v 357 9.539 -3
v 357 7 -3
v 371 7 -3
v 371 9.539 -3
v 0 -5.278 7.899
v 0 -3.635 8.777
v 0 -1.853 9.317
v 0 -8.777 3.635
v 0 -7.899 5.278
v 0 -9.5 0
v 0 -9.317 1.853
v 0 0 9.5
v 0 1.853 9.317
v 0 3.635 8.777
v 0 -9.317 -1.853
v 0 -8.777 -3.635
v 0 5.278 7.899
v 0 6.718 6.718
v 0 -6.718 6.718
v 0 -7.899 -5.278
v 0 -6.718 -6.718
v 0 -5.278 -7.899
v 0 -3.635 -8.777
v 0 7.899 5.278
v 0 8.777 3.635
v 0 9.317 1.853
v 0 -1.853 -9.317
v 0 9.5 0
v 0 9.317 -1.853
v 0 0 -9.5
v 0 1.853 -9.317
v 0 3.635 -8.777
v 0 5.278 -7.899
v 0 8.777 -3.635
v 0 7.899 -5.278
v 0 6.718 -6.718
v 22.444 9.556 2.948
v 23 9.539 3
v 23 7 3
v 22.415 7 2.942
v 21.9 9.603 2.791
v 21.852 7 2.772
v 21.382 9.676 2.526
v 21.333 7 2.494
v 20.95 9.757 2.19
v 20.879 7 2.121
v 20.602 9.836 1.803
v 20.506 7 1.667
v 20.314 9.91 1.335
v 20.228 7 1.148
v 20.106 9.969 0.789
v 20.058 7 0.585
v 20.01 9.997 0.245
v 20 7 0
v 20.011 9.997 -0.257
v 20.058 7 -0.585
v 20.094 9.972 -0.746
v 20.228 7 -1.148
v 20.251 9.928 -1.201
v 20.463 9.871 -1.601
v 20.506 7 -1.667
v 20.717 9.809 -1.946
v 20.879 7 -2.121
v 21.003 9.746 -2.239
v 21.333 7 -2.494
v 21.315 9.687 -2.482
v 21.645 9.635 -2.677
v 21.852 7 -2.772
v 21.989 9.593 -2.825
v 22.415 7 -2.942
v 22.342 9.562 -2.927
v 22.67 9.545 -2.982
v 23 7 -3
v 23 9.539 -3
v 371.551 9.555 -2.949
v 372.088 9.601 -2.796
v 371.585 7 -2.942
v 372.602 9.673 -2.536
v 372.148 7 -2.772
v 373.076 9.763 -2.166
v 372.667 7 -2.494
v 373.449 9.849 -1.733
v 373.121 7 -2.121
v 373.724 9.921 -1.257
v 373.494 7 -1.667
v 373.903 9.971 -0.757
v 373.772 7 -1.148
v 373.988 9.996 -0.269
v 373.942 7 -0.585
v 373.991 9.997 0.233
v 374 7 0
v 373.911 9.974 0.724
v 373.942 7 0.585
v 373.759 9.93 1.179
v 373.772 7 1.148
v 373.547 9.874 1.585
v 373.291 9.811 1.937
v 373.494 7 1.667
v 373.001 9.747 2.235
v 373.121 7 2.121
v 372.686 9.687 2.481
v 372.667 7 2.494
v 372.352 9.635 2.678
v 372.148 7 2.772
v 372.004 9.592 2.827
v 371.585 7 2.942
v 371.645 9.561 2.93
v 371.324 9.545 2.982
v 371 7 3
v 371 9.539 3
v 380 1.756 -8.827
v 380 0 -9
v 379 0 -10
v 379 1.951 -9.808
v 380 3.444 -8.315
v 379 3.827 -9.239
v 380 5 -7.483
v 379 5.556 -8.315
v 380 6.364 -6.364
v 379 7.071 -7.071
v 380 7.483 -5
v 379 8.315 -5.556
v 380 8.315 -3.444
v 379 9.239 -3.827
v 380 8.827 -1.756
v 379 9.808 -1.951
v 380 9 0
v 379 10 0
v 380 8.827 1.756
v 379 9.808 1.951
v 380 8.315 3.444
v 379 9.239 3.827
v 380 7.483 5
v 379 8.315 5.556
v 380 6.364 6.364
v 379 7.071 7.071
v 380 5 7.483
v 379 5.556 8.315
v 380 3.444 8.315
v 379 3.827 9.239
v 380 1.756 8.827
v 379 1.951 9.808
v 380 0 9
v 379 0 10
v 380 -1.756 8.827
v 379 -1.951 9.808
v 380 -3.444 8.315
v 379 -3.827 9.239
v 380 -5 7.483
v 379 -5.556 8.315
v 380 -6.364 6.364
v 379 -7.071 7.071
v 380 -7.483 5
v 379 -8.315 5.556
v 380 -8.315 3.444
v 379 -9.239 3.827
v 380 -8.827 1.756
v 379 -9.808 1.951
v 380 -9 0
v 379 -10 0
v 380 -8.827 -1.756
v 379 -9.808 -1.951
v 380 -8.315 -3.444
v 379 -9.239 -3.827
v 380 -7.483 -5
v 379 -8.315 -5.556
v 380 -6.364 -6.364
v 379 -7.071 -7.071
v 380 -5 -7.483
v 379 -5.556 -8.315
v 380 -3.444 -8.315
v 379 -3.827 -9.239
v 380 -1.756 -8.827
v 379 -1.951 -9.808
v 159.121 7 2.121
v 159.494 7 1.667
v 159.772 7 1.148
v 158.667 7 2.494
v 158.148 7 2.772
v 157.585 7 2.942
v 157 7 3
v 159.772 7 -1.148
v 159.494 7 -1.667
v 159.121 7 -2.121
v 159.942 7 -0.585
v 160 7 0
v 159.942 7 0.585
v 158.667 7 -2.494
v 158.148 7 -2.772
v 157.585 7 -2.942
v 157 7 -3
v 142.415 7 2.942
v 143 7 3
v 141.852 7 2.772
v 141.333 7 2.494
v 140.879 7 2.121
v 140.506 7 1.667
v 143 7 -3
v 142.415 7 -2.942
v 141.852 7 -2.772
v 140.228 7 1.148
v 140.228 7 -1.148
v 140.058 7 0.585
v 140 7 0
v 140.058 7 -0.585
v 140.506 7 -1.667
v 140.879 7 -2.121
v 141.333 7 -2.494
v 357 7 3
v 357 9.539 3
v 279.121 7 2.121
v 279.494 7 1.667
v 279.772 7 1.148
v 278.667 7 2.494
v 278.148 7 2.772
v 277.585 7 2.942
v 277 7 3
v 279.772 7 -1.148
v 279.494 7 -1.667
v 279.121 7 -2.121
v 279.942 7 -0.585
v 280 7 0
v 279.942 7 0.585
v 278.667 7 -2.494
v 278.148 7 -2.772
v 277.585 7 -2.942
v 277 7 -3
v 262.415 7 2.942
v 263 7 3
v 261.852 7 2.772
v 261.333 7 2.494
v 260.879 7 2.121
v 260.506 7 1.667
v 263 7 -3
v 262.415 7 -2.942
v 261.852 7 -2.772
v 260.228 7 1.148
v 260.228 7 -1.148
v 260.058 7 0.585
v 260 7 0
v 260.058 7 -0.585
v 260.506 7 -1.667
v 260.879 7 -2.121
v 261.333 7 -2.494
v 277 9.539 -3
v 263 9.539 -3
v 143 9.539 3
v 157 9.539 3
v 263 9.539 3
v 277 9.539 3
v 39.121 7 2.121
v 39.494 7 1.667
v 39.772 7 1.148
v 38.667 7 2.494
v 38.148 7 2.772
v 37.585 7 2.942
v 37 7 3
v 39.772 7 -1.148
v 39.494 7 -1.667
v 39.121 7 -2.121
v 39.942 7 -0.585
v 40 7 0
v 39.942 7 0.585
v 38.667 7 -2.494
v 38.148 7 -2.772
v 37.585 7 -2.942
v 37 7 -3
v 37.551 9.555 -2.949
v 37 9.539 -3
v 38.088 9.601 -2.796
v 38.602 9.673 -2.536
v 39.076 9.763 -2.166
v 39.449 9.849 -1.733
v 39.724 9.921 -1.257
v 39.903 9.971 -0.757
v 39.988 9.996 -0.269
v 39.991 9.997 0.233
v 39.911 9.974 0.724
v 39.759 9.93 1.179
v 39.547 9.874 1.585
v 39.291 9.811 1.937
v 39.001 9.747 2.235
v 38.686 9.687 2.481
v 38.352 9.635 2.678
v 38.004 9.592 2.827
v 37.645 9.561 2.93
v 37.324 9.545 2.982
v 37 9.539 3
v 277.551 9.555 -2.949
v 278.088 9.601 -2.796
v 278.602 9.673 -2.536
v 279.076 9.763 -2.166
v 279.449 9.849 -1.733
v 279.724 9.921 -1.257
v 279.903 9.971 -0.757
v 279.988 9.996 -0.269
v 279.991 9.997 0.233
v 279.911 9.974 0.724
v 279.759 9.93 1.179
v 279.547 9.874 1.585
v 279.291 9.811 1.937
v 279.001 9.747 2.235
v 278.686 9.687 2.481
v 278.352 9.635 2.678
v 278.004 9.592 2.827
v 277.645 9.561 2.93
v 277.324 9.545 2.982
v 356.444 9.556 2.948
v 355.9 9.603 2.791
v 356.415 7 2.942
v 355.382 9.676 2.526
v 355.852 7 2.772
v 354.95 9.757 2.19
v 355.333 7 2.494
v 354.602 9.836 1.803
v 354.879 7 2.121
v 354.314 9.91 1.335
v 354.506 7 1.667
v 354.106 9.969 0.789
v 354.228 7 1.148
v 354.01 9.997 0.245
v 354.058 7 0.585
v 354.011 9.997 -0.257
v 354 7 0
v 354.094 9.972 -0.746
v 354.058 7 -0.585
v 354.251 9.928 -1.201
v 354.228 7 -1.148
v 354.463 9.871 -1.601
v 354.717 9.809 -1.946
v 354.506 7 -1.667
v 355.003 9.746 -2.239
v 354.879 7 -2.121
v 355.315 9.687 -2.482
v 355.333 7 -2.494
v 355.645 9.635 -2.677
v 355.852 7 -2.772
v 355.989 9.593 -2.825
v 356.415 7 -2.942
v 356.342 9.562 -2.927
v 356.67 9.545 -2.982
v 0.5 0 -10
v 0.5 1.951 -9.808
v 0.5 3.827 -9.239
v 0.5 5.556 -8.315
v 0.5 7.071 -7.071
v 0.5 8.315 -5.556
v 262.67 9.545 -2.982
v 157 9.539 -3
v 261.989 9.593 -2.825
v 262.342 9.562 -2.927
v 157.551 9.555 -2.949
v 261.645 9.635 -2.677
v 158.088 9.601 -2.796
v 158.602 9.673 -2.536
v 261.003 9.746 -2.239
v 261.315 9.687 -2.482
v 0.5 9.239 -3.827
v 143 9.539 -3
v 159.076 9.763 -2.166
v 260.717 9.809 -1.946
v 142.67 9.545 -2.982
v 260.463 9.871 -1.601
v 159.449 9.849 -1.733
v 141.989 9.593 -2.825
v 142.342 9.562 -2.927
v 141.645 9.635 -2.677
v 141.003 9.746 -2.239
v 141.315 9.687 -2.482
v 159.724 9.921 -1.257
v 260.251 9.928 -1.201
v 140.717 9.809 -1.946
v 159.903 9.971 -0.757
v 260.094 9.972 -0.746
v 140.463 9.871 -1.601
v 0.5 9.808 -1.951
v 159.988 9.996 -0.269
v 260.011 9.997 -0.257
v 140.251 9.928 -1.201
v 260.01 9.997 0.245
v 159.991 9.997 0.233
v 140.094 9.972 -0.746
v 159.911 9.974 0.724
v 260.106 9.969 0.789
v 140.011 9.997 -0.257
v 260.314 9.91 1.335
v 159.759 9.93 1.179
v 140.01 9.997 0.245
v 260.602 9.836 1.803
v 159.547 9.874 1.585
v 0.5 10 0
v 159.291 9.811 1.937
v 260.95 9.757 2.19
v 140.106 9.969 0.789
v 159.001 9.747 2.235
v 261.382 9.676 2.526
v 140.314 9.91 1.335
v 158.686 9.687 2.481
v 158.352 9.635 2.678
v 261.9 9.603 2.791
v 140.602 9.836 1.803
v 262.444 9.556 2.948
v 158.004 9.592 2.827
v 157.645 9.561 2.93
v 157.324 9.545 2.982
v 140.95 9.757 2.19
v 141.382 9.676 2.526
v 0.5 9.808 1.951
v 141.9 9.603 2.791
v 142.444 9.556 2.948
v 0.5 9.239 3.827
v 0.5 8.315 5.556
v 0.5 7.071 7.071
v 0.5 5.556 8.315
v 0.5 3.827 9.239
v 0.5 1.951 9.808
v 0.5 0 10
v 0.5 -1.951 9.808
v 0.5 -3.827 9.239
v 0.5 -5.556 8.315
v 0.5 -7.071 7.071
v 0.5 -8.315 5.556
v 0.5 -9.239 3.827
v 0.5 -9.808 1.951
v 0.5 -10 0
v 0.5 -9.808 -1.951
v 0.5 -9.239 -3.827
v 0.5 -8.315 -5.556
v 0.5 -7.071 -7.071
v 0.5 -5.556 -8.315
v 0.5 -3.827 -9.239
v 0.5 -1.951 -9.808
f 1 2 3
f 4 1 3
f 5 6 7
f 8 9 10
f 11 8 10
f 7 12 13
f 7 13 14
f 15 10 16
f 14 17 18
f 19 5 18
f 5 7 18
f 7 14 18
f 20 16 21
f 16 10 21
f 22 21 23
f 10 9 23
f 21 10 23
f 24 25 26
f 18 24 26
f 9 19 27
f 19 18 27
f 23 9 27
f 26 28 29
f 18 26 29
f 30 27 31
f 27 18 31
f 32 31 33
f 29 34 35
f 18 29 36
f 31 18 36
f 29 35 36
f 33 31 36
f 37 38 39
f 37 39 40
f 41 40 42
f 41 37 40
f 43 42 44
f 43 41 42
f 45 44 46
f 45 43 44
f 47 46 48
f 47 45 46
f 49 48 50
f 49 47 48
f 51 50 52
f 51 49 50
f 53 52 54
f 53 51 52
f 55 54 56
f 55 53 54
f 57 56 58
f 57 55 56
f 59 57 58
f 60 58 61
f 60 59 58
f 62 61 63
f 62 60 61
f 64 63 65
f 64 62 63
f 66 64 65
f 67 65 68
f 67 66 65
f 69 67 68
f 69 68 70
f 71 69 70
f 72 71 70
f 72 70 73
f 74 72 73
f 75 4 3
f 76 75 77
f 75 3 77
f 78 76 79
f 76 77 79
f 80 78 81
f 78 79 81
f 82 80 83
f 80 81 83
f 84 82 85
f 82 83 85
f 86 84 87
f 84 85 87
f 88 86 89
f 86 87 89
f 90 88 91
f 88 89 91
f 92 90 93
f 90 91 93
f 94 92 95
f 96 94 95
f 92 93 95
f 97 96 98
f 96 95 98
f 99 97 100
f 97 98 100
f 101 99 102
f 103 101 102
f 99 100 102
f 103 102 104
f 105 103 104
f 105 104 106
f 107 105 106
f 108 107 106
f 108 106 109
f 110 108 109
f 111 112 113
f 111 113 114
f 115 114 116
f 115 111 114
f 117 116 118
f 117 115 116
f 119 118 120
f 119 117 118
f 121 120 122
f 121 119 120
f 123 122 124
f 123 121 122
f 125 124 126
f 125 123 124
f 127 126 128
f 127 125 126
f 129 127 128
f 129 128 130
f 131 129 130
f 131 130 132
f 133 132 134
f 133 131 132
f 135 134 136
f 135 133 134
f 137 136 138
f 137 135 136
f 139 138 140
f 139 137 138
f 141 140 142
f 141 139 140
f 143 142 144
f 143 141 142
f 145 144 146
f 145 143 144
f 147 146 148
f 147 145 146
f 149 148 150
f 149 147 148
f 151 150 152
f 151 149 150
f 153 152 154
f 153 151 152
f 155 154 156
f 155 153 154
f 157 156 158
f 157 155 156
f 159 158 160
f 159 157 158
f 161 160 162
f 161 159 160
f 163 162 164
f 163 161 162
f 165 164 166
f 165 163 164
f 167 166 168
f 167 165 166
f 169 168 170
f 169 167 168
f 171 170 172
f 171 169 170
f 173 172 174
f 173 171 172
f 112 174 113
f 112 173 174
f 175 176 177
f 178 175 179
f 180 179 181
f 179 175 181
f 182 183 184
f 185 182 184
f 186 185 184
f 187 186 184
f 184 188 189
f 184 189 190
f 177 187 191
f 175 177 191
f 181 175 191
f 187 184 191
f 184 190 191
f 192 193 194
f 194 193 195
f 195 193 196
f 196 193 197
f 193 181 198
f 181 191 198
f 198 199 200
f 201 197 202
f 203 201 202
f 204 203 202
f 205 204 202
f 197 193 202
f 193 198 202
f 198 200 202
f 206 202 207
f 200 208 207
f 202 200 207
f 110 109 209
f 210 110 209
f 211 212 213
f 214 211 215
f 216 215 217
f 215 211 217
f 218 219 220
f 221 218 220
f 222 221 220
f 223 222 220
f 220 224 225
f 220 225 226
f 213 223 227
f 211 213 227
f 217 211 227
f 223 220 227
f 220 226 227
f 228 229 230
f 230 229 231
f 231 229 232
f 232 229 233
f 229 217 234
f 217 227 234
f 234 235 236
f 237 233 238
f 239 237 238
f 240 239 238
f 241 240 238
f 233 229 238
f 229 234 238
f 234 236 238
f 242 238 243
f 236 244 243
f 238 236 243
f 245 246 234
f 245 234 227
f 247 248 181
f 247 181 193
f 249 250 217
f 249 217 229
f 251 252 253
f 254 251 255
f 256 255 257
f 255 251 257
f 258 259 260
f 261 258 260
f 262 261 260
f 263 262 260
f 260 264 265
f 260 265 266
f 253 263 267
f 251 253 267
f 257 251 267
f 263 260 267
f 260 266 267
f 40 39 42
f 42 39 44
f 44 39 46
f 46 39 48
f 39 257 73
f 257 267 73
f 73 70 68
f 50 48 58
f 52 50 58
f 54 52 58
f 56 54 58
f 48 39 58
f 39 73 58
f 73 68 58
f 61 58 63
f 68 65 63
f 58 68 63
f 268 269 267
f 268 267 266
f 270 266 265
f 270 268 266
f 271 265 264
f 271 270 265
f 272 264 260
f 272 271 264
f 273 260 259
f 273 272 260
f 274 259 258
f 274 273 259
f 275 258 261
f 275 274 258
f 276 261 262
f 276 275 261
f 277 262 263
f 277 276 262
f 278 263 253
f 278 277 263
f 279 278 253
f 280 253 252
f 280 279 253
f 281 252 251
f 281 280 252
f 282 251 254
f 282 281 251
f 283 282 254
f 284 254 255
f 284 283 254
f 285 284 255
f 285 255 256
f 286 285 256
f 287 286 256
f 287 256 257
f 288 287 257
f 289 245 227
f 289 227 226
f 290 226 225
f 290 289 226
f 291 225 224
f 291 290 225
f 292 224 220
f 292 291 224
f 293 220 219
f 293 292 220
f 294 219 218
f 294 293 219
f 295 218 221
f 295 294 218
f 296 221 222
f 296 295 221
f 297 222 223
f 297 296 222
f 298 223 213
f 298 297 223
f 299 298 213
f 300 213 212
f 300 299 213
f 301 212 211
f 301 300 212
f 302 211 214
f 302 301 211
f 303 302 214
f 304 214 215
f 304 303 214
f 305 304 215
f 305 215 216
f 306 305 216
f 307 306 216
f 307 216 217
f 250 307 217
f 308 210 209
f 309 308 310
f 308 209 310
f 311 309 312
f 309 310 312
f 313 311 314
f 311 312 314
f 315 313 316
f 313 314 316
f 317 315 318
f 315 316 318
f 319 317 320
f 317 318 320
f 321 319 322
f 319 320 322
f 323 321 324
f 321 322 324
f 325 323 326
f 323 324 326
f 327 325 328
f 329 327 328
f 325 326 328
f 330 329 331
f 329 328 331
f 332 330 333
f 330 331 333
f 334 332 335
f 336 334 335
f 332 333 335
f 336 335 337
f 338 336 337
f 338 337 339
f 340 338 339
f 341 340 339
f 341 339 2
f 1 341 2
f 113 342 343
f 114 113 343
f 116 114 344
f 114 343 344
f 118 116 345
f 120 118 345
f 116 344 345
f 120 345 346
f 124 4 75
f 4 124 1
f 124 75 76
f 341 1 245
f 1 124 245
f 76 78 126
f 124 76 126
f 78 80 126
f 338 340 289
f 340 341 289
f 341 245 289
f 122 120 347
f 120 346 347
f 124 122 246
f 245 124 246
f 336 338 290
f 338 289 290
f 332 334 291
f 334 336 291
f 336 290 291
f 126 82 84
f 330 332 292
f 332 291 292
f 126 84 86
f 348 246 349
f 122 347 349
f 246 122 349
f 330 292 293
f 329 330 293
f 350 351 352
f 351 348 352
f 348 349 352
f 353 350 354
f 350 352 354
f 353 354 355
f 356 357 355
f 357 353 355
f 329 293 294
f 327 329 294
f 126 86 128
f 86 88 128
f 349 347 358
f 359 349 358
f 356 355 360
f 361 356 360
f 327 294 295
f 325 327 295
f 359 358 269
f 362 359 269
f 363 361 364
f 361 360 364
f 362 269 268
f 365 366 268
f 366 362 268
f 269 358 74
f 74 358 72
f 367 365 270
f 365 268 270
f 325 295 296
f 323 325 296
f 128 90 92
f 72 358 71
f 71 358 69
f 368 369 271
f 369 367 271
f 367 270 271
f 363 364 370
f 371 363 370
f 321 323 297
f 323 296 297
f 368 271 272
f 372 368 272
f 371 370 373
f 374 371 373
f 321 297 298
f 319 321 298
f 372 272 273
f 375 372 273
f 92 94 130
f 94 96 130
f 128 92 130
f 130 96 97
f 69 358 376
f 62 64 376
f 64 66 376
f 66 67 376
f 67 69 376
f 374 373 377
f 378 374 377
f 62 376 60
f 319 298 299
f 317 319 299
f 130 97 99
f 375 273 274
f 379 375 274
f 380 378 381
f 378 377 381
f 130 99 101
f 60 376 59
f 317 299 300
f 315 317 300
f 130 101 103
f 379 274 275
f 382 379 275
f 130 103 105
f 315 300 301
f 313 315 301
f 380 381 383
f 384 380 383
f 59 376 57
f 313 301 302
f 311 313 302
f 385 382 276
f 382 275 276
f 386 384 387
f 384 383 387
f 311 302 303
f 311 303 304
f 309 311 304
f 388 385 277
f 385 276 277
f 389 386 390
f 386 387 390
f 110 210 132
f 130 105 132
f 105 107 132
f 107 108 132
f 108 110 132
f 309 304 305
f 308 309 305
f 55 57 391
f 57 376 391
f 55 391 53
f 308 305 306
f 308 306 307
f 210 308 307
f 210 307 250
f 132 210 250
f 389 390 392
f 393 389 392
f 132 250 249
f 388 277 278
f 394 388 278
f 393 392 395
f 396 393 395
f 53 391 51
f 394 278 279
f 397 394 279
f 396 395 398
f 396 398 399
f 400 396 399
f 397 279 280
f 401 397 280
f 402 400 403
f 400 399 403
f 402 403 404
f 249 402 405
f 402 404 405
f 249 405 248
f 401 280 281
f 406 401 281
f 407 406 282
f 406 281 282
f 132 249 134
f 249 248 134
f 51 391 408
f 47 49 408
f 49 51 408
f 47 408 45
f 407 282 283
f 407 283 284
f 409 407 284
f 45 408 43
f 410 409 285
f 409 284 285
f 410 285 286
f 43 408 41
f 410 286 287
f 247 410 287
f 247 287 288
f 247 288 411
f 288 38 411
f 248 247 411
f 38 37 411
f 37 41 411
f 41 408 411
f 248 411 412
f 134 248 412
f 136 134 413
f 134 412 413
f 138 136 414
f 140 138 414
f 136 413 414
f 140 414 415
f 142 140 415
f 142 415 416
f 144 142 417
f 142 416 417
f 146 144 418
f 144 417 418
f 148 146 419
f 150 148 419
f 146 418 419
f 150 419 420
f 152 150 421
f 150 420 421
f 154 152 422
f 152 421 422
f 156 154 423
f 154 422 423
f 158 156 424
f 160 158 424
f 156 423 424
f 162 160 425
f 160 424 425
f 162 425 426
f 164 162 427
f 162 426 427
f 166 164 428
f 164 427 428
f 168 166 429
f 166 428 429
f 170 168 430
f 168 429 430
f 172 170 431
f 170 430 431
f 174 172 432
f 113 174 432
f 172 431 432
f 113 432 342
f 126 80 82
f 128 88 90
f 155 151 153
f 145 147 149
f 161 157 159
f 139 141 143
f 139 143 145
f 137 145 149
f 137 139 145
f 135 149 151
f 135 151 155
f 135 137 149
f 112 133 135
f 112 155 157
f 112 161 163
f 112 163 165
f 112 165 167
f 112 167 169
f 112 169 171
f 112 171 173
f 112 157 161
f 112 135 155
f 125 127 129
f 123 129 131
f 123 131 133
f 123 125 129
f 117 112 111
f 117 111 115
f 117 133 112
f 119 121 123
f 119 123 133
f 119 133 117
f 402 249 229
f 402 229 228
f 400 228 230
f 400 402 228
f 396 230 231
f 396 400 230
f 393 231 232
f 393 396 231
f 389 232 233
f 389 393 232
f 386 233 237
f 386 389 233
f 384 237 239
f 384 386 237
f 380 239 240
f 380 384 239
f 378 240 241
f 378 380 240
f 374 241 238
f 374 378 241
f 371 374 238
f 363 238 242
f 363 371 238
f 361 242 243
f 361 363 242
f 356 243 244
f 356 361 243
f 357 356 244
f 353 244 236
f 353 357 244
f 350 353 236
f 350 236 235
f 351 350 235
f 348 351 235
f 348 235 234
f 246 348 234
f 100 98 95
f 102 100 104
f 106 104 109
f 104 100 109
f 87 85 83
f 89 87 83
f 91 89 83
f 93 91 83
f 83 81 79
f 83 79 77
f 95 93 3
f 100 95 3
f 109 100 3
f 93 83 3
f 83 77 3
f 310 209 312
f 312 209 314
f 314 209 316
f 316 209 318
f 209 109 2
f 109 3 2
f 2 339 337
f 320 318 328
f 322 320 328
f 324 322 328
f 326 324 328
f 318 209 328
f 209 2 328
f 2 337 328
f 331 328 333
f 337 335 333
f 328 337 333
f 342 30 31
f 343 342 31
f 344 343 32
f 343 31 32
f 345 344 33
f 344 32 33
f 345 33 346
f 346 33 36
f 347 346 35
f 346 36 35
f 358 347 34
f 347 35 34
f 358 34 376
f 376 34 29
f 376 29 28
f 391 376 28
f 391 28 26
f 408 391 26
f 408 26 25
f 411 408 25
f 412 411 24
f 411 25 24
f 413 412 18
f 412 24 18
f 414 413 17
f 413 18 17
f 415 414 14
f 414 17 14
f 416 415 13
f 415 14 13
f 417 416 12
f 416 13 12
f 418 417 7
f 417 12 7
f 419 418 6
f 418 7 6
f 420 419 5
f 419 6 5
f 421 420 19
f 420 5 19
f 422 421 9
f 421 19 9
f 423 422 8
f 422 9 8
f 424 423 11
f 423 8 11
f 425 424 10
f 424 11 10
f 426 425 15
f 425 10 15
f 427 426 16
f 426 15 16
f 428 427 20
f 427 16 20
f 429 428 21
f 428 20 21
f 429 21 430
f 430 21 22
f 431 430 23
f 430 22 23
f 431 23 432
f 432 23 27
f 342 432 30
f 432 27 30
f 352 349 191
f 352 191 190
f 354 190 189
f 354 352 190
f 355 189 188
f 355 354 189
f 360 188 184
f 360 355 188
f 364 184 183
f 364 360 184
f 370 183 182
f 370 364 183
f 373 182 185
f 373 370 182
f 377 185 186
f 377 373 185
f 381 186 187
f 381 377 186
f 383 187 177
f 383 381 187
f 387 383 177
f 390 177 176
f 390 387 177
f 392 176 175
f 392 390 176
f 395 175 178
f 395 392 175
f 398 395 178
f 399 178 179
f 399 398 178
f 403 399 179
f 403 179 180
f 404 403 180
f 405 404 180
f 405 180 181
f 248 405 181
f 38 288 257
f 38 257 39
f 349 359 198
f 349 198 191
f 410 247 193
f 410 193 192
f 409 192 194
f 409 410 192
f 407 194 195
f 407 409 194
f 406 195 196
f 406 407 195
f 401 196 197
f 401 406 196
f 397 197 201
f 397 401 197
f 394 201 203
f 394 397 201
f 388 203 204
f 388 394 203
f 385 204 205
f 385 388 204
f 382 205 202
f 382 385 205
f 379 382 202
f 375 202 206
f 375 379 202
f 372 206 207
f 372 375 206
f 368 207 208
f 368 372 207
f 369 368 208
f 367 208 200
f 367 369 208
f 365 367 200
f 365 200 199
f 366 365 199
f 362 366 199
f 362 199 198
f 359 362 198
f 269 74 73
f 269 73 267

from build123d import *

# Parameters (mm, degrees)
SKETCH_1_R             = 10
EXTRUDE_1_DEPTH        = 300
CUT_EXTRUDE_1_DEPTH    = 3
CHAMFER_1_SIZE         = 0.5
CHAMFER_2_SIZE         = 0.5
PATTERN_LINEAR_1_COUNT = 3
PATTERN_LINEAR_1_PITCH = 120
EXTRUDE_START          = -10
SKETCH_3_R             = 10
EXTRUDE_2_DEPTH        = 110
CHAMFER_3_SIZE         = 1
CUT_EXTRUDE_2_DEPTH    = 60
CUT_EXTRUDE_START      = -20
SKETCH_5_R             = 10
CUT_EXTRUDE_3_DEPTH    = 20
CHAMFER_4_SIZE         = 1


with BuildPart() as part:
    # 草图1 → 凸台-拉伸1 (new body)
    with BuildSketch(Plane(origin=(0, 0, 0), x_dir=(0, 0, -1), z_dir=(1, 0, 0))):
        Circle(SKETCH_1_R)
    extrude(amount=EXTRUDE_1_DEPTH)

    # 草图2 → 切除-拉伸1 (cut)
    with BuildSketch(Plane(origin=(0, 10, 0), x_dir=(1, 0, 0), z_dir=(0, 1, 0))):
        with BuildLine():
            Line((263, 3), (277, 3))
            ThreePointArc((277, 3), (280, 0), (277, -3))
            Line((277, -3), (263, -3))
            ThreePointArc((263, -3), (260, 0), (263, 3))
        make_face()
    cut_extrude_1 = extrude(amount=-CUT_EXTRUDE_1_DEPTH, mode=Mode.SUBTRACT)

    # 倒角1
    chamfer_1_edges = [part.edges().sort_by_distance(p)[0] for p in [
        (0, 0, 10),
    ]]
    chamfer(chamfer_1_edges, length=CHAMFER_1_SIZE)

    # 倒角2
    chamfer_2_edges = [part.edges().sort_by_distance(p)[0] for p in [
        (300, 0, 10),
    ]]
    chamfer(chamfer_2_edges, length=CHAMFER_2_SIZE)

    # 阵列(线性)1: 切除-拉伸1 ×3
    with Locations(*[(-i * PATTERN_LINEAR_1_PITCH, 0, 0) for i in range(1, PATTERN_LINEAR_1_COUNT)]):
        add(cut_extrude_1, mode=Mode.SUBTRACT)

    # 草图3 → 凸台-拉伸2 (add)
    with BuildSketch(Plane(origin=(300, 0, 0), x_dir=(0, 0, -1), z_dir=(1, 0, 0)).offset(EXTRUDE_START)):
        Circle(SKETCH_3_R)
    extrude(amount=EXTRUDE_2_DEPTH)

    # 倒角3
    chamfer_3_edges = [part.edges().sort_by_distance(p)[0] for p in [
        (400, 0, 10),
    ]]
    chamfer(chamfer_3_edges, length=CHAMFER_3_SIZE)

    # 草图4 → 切除-拉伸2 (cut)
    with BuildSketch(Plane(origin=(0, 7, 0), x_dir=(1, 0, 0), z_dir=(0, 1, 0))):
        with BuildLine():
            Line((357, 3), (371, 3))
            ThreePointArc((371, 3), (374, 0), (371, -3))
            Line((371, -3), (357, -3))
            ThreePointArc((357, -3), (354, 0), (357, 3))
        make_face()
    extrude(amount=CUT_EXTRUDE_2_DEPTH, mode=Mode.SUBTRACT)

    # 草图5 → 切除-拉伸3 (cut)
    with BuildSketch(Plane(origin=(400, 0, 0), x_dir=(0, 0, -1), z_dir=(1, 0, 0)).offset(CUT_EXTRUDE_START)):
        Circle(SKETCH_5_R)
    extrude(amount=CUT_EXTRUDE_3_DEPTH, mode=Mode.SUBTRACT)

    # 倒角4
    chamfer_4_edges = [part.edges().sort_by_distance(p)[0] for p in [
        (380, 0, 10),
    ]]
    chamfer(chamfer_4_edges, length=CHAMFER_4_SIZE)


solid = part.part
